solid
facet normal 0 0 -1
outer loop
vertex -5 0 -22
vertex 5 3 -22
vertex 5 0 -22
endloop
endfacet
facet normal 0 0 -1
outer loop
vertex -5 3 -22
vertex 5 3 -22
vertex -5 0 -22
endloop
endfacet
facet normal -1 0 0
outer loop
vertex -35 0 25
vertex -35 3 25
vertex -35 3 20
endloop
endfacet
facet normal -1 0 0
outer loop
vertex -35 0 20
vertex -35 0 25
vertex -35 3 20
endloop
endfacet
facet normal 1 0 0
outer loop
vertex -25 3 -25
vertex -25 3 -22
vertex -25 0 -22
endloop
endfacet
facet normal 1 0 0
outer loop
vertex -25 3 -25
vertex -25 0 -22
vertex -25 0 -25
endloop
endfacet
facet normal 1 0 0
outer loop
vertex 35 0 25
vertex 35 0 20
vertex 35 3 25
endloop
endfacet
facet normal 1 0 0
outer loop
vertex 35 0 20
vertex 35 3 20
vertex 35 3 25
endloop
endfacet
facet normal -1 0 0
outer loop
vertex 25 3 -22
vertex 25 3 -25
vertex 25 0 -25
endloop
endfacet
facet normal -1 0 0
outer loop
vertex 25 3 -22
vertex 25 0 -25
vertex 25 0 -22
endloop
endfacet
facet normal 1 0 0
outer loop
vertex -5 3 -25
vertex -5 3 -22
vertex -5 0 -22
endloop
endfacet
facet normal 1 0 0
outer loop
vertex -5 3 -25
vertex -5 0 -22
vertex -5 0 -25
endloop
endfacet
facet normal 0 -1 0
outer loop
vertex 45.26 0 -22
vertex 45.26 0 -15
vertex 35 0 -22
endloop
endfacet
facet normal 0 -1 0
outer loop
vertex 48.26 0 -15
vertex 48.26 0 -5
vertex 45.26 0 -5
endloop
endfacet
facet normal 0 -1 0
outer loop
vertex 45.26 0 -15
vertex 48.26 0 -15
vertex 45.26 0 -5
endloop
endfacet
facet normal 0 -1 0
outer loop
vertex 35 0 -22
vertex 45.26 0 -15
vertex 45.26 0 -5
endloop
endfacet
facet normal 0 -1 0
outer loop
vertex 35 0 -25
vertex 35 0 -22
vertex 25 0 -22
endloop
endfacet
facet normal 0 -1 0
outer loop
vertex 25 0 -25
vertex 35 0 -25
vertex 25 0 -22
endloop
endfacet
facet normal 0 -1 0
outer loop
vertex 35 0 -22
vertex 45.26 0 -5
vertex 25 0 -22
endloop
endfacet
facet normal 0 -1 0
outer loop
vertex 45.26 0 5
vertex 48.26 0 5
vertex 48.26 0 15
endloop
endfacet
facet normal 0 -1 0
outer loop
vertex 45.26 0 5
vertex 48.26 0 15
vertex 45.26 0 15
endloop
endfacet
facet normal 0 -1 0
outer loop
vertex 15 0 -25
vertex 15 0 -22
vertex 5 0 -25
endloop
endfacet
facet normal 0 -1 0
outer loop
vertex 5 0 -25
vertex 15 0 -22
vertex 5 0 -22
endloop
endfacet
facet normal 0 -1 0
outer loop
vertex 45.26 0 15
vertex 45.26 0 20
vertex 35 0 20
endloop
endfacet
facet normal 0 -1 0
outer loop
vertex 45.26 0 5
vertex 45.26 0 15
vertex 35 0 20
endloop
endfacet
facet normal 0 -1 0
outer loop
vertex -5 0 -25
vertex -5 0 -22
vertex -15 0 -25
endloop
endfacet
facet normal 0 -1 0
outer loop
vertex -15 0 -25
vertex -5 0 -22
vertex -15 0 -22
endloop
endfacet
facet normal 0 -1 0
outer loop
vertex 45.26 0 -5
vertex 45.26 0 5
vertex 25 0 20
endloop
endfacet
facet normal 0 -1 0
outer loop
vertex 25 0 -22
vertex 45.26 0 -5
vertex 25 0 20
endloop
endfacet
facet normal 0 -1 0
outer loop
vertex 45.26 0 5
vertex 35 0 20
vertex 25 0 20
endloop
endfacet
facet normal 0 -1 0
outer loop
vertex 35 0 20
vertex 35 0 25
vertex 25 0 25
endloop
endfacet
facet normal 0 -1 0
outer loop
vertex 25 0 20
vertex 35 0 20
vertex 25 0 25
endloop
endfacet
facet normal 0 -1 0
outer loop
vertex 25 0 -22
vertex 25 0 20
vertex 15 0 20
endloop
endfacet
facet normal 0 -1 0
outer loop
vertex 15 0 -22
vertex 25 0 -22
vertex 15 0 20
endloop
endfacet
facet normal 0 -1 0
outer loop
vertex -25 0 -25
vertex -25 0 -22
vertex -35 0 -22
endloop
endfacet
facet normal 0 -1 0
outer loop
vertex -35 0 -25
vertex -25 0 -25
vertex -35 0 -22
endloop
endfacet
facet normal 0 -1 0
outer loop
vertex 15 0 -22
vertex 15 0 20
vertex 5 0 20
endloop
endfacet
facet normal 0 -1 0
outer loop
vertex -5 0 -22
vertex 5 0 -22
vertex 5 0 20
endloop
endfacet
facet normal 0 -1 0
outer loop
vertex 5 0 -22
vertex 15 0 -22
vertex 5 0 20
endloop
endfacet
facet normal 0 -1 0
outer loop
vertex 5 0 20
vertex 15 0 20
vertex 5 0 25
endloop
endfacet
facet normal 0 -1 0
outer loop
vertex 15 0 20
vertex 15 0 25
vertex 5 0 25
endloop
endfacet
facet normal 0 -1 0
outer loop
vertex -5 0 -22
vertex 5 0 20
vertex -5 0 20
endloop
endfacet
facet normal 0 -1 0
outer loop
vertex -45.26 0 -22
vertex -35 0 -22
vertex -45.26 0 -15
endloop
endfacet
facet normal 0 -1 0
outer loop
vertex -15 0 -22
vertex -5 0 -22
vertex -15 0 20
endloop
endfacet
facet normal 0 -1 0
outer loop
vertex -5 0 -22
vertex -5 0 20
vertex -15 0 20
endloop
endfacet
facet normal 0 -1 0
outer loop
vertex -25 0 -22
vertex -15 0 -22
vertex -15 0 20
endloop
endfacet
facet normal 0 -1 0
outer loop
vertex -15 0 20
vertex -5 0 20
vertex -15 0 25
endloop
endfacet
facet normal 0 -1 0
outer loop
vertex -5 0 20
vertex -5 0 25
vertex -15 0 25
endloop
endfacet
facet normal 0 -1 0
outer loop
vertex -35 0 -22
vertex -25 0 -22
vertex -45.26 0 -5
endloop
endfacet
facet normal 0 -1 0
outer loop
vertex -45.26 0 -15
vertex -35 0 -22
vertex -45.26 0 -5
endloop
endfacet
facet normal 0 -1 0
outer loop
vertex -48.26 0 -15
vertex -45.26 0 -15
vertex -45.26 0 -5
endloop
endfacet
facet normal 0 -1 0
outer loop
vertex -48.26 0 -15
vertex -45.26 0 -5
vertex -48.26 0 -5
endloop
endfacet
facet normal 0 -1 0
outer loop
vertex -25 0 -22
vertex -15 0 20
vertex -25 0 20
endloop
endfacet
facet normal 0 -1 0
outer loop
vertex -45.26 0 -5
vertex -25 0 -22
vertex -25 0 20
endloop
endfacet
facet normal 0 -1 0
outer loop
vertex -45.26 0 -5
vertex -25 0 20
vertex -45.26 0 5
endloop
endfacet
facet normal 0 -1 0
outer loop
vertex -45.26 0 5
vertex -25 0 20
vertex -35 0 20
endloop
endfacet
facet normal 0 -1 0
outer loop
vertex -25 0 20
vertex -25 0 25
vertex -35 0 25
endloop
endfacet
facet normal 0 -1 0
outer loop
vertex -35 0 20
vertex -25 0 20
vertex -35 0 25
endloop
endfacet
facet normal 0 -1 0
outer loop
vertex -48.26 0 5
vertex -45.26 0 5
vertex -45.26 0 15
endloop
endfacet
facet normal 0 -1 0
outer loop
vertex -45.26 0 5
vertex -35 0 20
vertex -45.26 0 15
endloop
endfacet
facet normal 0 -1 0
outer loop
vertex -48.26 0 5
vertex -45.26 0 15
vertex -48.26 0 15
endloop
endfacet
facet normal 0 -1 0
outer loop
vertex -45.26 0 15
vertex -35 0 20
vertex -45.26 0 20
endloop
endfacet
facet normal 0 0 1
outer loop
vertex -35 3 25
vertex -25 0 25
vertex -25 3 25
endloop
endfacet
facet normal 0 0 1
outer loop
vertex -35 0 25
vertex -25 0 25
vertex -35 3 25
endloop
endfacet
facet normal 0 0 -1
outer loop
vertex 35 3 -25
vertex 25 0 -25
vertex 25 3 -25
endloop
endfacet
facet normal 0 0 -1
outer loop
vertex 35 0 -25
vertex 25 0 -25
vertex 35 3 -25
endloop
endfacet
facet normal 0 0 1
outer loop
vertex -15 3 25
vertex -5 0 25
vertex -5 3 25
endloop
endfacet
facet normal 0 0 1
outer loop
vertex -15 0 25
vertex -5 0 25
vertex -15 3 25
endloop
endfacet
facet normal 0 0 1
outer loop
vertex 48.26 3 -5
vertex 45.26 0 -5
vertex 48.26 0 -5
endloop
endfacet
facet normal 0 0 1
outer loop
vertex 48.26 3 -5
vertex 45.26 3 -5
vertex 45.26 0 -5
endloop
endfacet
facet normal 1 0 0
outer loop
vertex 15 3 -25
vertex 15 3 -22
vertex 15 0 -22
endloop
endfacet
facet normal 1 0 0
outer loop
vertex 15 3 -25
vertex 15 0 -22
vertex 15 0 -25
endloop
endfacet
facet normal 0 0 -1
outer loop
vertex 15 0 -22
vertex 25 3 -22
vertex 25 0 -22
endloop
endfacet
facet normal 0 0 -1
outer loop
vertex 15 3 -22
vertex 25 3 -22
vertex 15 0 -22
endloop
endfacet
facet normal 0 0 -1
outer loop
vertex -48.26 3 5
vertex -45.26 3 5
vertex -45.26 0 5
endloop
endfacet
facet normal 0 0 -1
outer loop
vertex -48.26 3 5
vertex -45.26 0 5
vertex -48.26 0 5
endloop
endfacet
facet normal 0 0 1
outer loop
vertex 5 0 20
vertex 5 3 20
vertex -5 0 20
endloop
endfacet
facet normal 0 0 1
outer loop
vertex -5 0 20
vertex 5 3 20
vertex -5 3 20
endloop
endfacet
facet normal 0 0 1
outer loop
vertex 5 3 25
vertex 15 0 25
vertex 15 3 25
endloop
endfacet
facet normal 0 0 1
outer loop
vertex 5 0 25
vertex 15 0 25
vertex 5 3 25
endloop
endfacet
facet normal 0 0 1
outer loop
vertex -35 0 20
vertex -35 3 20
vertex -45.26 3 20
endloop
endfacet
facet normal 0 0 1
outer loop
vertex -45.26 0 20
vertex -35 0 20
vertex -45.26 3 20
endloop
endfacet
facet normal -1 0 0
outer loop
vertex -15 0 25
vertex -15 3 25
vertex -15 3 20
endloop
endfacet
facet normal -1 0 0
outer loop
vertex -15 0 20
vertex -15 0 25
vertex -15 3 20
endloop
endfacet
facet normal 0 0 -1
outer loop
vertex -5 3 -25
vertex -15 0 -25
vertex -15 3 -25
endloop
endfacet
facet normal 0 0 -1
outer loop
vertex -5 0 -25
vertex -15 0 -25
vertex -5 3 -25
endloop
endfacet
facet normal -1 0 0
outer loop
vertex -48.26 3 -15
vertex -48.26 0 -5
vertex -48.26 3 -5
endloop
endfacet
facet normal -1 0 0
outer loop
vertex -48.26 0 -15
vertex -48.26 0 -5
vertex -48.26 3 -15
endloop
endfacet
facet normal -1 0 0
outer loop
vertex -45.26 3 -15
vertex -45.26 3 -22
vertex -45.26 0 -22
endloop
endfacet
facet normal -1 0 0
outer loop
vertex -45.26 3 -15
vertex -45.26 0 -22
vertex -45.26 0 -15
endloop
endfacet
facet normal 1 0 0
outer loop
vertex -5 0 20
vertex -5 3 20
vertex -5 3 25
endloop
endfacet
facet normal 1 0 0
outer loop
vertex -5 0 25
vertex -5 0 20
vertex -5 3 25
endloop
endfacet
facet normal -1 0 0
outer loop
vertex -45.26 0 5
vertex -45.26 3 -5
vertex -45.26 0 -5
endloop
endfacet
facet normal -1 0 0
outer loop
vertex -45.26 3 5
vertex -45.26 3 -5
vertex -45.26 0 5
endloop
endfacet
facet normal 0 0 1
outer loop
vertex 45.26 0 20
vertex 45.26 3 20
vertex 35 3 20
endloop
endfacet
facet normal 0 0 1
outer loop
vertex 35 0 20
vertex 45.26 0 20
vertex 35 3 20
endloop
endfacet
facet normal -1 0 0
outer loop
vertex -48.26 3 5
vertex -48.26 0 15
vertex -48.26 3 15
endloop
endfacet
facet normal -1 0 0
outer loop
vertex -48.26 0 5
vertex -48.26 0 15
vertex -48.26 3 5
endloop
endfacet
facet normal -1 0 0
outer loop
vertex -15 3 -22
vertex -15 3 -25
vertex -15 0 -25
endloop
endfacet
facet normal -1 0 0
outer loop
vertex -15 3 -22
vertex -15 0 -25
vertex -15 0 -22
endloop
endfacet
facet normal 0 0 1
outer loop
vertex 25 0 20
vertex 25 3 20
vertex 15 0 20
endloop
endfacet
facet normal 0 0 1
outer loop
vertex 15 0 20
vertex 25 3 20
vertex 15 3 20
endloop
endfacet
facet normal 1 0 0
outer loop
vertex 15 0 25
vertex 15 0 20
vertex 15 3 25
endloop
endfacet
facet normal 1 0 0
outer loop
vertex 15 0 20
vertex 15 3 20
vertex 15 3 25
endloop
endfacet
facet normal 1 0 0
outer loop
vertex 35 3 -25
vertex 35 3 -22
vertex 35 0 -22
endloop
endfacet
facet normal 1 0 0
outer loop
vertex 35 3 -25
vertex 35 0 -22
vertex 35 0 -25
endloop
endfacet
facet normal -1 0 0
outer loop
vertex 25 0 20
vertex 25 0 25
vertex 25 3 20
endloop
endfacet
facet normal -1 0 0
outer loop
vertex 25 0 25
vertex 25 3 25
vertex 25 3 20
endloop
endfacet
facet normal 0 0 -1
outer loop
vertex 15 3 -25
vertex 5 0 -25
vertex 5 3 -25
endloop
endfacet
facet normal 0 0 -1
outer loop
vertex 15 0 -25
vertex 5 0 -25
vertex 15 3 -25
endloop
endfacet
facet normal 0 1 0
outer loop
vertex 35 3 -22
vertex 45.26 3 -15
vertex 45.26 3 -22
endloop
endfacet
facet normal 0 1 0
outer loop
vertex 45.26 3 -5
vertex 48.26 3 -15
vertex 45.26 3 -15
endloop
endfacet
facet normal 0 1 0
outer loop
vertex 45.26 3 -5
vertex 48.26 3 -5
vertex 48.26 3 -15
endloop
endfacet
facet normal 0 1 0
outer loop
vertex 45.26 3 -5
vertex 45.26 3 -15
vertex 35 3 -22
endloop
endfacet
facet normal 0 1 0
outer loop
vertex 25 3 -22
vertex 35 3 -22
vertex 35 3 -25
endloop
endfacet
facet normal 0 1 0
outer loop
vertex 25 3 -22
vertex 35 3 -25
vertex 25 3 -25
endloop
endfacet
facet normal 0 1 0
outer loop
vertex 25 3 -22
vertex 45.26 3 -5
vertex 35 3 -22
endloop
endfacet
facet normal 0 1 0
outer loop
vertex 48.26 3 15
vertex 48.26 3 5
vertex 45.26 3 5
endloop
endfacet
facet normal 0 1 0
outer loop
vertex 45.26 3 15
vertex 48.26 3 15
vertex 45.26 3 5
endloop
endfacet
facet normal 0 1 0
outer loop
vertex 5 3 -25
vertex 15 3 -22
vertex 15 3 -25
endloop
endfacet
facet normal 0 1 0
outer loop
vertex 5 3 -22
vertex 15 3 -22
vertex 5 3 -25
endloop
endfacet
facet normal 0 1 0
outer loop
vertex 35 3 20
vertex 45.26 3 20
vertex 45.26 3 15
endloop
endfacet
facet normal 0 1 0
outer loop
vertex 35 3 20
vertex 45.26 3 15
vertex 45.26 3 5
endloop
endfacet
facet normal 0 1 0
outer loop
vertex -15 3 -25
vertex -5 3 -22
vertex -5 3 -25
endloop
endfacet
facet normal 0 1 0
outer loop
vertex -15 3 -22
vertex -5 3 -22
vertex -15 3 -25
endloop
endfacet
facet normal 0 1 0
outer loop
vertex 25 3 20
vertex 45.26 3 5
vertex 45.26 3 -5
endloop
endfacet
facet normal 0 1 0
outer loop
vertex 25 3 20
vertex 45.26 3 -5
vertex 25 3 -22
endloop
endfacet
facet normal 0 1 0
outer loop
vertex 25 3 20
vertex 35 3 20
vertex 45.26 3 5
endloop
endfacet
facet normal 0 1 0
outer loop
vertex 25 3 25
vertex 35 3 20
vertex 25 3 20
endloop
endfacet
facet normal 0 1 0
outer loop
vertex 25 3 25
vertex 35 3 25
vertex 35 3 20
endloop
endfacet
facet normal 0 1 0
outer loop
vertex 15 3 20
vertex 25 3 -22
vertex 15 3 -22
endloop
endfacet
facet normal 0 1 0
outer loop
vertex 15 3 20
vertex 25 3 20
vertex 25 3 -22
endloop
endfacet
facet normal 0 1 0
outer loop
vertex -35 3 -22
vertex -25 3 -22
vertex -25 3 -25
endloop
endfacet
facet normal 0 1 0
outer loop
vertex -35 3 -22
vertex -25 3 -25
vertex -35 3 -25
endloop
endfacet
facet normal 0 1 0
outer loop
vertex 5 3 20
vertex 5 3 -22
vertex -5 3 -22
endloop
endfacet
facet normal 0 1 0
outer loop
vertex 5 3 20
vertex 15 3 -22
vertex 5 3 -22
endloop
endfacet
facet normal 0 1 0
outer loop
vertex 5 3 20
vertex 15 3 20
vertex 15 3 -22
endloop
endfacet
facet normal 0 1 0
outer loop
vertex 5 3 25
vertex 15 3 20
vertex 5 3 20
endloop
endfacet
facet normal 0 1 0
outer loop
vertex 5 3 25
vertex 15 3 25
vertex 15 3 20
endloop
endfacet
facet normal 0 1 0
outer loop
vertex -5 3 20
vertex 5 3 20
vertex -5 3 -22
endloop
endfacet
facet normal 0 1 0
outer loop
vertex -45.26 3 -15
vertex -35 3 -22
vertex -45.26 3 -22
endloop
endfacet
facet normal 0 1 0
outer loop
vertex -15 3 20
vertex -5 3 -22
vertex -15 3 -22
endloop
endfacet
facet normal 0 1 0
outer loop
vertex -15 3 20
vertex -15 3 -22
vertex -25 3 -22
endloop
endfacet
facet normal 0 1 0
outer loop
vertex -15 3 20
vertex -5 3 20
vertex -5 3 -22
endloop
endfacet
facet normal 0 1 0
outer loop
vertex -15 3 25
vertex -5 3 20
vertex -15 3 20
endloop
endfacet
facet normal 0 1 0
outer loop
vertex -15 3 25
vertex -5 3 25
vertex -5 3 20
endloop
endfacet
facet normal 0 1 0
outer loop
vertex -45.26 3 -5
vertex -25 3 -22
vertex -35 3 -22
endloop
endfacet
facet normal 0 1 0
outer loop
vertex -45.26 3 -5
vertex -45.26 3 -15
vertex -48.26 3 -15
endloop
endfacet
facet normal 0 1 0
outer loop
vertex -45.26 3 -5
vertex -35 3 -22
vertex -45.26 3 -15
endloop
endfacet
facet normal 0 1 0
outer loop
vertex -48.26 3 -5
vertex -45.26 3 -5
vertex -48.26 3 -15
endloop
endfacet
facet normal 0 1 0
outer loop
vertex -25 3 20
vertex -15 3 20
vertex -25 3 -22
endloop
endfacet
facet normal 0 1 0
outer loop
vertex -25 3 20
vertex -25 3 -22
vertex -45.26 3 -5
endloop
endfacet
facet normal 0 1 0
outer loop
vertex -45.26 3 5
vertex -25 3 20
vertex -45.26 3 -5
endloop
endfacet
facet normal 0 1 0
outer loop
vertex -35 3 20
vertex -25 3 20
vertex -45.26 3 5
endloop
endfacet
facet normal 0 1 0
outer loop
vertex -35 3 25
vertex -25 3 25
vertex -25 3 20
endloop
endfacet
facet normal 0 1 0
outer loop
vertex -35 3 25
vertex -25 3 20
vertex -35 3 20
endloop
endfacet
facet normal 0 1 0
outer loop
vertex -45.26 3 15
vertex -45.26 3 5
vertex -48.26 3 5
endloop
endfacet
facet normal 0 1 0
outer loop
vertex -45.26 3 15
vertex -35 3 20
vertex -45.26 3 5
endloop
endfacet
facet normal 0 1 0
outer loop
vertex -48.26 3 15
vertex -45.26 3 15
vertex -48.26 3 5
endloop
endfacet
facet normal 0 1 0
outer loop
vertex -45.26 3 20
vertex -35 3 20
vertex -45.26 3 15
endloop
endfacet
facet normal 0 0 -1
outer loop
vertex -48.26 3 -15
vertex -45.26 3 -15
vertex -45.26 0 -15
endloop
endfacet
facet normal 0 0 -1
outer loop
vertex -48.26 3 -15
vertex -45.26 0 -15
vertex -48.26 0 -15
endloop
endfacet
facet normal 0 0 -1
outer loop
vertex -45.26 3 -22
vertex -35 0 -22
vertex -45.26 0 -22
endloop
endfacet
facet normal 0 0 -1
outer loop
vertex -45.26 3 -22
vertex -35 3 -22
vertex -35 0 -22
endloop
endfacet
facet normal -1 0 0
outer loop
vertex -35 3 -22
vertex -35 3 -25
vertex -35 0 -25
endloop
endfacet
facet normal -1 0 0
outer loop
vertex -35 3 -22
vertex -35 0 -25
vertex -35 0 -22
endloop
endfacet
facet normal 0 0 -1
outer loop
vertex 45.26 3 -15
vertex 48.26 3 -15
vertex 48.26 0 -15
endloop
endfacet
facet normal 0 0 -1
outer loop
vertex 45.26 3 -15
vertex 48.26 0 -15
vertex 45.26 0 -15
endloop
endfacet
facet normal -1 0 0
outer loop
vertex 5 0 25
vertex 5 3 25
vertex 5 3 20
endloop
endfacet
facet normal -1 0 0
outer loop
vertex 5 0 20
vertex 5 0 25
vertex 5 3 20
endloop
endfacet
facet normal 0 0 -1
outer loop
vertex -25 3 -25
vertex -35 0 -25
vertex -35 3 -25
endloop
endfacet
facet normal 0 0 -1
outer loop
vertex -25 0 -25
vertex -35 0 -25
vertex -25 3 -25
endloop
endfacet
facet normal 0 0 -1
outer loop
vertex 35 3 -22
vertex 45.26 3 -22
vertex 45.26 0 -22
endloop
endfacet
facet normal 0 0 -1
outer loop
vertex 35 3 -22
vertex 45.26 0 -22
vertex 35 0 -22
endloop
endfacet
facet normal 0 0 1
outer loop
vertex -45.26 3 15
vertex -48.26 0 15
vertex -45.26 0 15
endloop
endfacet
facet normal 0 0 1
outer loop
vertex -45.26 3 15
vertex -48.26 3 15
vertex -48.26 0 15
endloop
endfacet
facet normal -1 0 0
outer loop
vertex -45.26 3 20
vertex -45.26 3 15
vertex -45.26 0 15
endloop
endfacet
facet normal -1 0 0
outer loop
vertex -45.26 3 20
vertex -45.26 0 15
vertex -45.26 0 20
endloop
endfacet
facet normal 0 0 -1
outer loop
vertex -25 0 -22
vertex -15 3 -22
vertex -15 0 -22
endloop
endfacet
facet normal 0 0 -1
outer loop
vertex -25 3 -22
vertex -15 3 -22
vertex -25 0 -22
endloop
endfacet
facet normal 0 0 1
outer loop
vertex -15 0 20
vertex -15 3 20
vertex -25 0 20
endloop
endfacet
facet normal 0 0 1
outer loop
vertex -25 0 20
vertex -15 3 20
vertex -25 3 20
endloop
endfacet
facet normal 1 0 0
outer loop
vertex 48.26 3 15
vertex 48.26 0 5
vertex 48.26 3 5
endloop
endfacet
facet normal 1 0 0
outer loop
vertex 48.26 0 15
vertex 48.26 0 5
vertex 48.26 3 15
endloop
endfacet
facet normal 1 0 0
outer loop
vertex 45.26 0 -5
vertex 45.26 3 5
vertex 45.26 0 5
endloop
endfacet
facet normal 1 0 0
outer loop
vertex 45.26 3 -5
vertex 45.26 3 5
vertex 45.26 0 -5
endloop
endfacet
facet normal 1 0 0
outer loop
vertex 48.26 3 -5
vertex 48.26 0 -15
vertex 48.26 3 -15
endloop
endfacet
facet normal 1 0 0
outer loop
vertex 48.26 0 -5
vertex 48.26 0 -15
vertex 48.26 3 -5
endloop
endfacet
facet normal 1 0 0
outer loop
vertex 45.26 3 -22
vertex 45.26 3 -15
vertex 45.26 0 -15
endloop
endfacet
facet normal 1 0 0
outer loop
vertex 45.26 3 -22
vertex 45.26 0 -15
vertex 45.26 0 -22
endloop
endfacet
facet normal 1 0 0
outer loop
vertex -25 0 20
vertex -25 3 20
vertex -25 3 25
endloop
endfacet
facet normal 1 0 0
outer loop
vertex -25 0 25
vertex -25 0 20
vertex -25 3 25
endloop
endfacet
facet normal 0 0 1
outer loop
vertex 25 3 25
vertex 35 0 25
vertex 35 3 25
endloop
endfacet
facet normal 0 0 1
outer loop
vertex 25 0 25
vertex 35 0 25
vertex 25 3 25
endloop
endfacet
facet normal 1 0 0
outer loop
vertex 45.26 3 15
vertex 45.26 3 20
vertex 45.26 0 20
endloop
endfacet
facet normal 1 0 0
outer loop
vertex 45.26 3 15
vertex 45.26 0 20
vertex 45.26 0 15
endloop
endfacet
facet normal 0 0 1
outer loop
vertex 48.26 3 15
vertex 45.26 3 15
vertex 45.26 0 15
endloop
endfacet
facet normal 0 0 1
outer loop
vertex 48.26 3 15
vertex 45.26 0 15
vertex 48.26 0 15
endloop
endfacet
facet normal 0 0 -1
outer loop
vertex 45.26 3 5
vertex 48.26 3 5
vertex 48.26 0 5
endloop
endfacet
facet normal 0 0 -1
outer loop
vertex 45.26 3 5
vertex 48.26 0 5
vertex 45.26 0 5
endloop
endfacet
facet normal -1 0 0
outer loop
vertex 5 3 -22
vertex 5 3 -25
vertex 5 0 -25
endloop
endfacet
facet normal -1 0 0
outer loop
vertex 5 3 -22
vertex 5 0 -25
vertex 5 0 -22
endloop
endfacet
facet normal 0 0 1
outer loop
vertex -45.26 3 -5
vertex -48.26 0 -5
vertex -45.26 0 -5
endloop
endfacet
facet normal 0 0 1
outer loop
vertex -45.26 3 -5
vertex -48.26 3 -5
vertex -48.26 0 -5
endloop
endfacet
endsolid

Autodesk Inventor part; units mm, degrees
ref_plane "YZ Plane" through (0, 0, 0) normal (1, 0, 0) x (0, 1, 0)
ref_plane "XZ Plane" through (0, 0, 0) normal (0, 1, 0) x (-1, 0, 0)
ref_plane "XY Plane" through (0, 0, 0) normal (0, 0, 1) x (1, 0, 0)
sketch "Sketch1" plane through (0, 0, 0) normal (0, 1, 0) x (-1, 0, 0)
  line L0 (-48.26, 25) -> (48.26, 25)
  line L1 (48.26, 25) -> (48.26, -25)
  line L2 (48.26, -25) -> (-48.26, -25)
  line L3 (-48.26, -25) -> (-48.26, 25)
  line L4 (-48.26, 25) -> (48.26, -25) construction
  line L5 (48.26, 25) -> (-48.26, -25) construction
  point P0 (0, 0)
  dimension "d0" = 96.52
  dimension "d1" = 50
extrude "Extrusion1" add sketch "Sketch1" along normal blind 3
sketch "Sketch2" plane through (0, 3, 0) normal (0, 1, 0) x (1, 0, 0)
  line L0 (48.26, 25) -> (-48.26, 25) construction
  line L1 (-5, 25) -> (5, 25)
  line L2 (5, 25) -> (5, 22)
  line L3 (5, 22) -> (-5, 22)
  line L4 (-5, 22) -> (-5, 25)
  line L5 (0, 35) -> (0, -35) construction
  point P0 (0, 0)
  dimension "d4" = 10
  dimension "d5" = 3
extrude "Extrusion2" cut sketch "Sketch2" against normal blind 3
pattern_linear "Rectangular Pattern1" count 3 spacing 20 along (-1, 0, 0) count 2 spacing 40 along (1, 0, 0) of "Extrusion2"
sketch "Sketch3" plane through (0, 3, 0) normal (0, 1, 0) x (1, 0, 0)
  line L0 (-48.26, -25) -> (48.26, -25) construction
  line L1 (-5, -25) -> (5, -25)
  line L2 (5, -25) -> (5, -20)
  line L3 (5, -20) -> (-5, -20)
  line L4 (-5, -20) -> (-5, -25)
  line L5 (0, 35) -> (0, -35) construction
  point P0 (0, 0)
  dimension "d14" = 10
  dimension "d15" = 5
extrude "Extrusion3" cut sketch "Sketch3" against normal through all
pattern_linear "Rectangular Pattern2" count 3 spacing 20 along (-1, 0, 0) count 2 spacing 40 along (1, 0, 0) of "Extrusion3"
sketch "Sketch4" plane through (0, 3, 0) normal (0, 1, 0) x (1, 0, 0)
  line L0 (-48.26, 25) -> (-48.26, -25) construction
  line L1 (-48.26, -25) -> (-48.26, 25) construction
  line L2 (-48.26, 5) -> (-45.26, 5)
  line L3 (-45.26, 5) -> (-45.26, -5)
  line L4 (-45.26, -5) -> (-48.26, -5)
  line L5 (-48.26, -5) -> (-48.26, 5)
  line L6 (67.564, 0) -> (-67.564, 0) construction
  point P0 (0, 0)
  dimension "d24" = 3
  dimension "d25" = 10
extrude "Extrusion4" cut sketch "Sketch4" against normal through all
pattern_linear "Rectangular Pattern3" count 2 spacing 20 along (0, 0, -1) count 2 spacing 40 along (0, 0, 1) of "Extrusion4"
mirror "Mirror1" about plane through (0, 0, 0) normal (1, 0, 0) of "Extrusion4", "Rectangular Pattern3"
sketch "Sketch5" plane through (0, 3, 0) normal (0, 1, 0) x (1, 0, 0)
  line L0 (-45, 22) -> (-35, 22) construction
  line L1 (-45.26, 25) -> (-45.26, 15) construction
  line L2 (-45, 22) -> (-45.26, 22)
  line L3 (-45.26, 22) -> (-45.26, 25)
  line L4 (-45.26, 25) -> (-45, 25)
  line L5 (-45, 25) -> (-45, 22)
  line L6 (-45, -25) -> (-45, -20) projected
  line L7 (-45.26, -25) -> (-45, -25) projected
  line L8 (-45, -20) -> (-45.26, -20)
  line L9 (-45.26, -20) -> (-45.26, -25)
  line L10 (-45.26, -25) -> (-45, -25)
  line L11 (-45, -25) -> (-45, -20)
  point P0 (0, 0)
extrude "Extrusion5" cut sketch "Sketch5" against normal through all
mirror "Mirror2" about plane through (0, 0, 0) normal (1, 0, 0) of "Extrusion5"
equation "\"d0\" = Module_Width"
equation "\"d1\" = Module_Depth"
equation "\"d2\" = Module_Case_Thickness"
equation "\"d4\" = Module_Case_SlotWidth"
equation "\"d5\" = Module_Case_SlotDepth"
equation "\"d6\" = Module_Case_Thickness"
equation "\"d10\" = 2 * Module_Case_SlotWidth"
equation "\"d13\" = 4 * Module_Case_SlotWidth"
equation "\"d14\" = Module_Case_SlotWidth"
equation "\"d15\" = Module_Case_BottomSlotDepth"
equation "\"d16\" = Module_Case_Thickness"
equation "\"d20\" = 2 * Module_Case_SlotWidth"
equation "\"d23\" = 4 * Module_Case_SlotWidth"
equation "\"d24\" = Module_Case_SlotDepth"
equation "\"d25\" = Module_Case_SlotWidth"
equation "\"d26\" = Module_Case_Thickness"
equation "\"d30\" = 2 * Module_Case_SlotWidth"
equation "\"d33\" = 4 * Module_Case_SlotWidth"
equation "\"RackWidth\" = 482.6"
equation "\"U\" = 44.5"
equation "\"Module_Width\" = 96.52"
equation "\"Module_Height\" = 89"
equation "\"Module_Depth\" = 50"
equation "\"Module_Case_Thickness\" = 3"
equation "\"Module_Back_Thickness\" = 5"
equation "\"Module_Case_SlotDepth\" = 3"
equation "\"Module_Case_BottomSlotDepth\" = 5"
equation "\"Module_Case_SlotWidth\" = 10"
equation "\"Module_Connector_Width\" = 6"
equation "\"Module_Connector_Depth\" = 4"
equation "\"Module_StatusIndicatorDiameter\" = 5"
properties part number "TopBottomPlate" material "Wood (Birch)"
